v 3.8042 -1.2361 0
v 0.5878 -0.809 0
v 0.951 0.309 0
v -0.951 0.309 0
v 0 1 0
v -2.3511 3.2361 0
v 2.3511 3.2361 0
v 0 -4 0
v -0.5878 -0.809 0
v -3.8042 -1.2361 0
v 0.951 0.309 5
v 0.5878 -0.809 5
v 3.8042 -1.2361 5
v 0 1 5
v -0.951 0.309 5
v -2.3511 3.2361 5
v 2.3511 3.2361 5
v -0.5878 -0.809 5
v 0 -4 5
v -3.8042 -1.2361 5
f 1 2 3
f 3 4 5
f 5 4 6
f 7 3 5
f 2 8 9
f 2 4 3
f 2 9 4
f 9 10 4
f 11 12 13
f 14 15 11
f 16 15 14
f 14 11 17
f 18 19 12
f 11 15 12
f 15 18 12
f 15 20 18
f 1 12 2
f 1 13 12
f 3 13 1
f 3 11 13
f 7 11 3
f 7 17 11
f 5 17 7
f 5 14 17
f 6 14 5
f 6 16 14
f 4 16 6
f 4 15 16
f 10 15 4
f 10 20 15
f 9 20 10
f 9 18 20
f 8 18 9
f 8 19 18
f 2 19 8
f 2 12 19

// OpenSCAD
function star2D(r1,r2,cnt) = [for(i=[0:cnt-1]) for(r=[r1,r2])  [sin(((r==r1?i:i+.5)*360/cnt))*r,cos(((r==r1?i:i+.5)*360/cnt))*r] ];
    
//function star2D(r1,r2,cnt) = [for(i=[0:cnt-1]) for(r=[r1,r2])  [i,r] ];
    
echo(star2D(1,4,5));
linear_extrude(5) polygon(star2D(1,4,5));
